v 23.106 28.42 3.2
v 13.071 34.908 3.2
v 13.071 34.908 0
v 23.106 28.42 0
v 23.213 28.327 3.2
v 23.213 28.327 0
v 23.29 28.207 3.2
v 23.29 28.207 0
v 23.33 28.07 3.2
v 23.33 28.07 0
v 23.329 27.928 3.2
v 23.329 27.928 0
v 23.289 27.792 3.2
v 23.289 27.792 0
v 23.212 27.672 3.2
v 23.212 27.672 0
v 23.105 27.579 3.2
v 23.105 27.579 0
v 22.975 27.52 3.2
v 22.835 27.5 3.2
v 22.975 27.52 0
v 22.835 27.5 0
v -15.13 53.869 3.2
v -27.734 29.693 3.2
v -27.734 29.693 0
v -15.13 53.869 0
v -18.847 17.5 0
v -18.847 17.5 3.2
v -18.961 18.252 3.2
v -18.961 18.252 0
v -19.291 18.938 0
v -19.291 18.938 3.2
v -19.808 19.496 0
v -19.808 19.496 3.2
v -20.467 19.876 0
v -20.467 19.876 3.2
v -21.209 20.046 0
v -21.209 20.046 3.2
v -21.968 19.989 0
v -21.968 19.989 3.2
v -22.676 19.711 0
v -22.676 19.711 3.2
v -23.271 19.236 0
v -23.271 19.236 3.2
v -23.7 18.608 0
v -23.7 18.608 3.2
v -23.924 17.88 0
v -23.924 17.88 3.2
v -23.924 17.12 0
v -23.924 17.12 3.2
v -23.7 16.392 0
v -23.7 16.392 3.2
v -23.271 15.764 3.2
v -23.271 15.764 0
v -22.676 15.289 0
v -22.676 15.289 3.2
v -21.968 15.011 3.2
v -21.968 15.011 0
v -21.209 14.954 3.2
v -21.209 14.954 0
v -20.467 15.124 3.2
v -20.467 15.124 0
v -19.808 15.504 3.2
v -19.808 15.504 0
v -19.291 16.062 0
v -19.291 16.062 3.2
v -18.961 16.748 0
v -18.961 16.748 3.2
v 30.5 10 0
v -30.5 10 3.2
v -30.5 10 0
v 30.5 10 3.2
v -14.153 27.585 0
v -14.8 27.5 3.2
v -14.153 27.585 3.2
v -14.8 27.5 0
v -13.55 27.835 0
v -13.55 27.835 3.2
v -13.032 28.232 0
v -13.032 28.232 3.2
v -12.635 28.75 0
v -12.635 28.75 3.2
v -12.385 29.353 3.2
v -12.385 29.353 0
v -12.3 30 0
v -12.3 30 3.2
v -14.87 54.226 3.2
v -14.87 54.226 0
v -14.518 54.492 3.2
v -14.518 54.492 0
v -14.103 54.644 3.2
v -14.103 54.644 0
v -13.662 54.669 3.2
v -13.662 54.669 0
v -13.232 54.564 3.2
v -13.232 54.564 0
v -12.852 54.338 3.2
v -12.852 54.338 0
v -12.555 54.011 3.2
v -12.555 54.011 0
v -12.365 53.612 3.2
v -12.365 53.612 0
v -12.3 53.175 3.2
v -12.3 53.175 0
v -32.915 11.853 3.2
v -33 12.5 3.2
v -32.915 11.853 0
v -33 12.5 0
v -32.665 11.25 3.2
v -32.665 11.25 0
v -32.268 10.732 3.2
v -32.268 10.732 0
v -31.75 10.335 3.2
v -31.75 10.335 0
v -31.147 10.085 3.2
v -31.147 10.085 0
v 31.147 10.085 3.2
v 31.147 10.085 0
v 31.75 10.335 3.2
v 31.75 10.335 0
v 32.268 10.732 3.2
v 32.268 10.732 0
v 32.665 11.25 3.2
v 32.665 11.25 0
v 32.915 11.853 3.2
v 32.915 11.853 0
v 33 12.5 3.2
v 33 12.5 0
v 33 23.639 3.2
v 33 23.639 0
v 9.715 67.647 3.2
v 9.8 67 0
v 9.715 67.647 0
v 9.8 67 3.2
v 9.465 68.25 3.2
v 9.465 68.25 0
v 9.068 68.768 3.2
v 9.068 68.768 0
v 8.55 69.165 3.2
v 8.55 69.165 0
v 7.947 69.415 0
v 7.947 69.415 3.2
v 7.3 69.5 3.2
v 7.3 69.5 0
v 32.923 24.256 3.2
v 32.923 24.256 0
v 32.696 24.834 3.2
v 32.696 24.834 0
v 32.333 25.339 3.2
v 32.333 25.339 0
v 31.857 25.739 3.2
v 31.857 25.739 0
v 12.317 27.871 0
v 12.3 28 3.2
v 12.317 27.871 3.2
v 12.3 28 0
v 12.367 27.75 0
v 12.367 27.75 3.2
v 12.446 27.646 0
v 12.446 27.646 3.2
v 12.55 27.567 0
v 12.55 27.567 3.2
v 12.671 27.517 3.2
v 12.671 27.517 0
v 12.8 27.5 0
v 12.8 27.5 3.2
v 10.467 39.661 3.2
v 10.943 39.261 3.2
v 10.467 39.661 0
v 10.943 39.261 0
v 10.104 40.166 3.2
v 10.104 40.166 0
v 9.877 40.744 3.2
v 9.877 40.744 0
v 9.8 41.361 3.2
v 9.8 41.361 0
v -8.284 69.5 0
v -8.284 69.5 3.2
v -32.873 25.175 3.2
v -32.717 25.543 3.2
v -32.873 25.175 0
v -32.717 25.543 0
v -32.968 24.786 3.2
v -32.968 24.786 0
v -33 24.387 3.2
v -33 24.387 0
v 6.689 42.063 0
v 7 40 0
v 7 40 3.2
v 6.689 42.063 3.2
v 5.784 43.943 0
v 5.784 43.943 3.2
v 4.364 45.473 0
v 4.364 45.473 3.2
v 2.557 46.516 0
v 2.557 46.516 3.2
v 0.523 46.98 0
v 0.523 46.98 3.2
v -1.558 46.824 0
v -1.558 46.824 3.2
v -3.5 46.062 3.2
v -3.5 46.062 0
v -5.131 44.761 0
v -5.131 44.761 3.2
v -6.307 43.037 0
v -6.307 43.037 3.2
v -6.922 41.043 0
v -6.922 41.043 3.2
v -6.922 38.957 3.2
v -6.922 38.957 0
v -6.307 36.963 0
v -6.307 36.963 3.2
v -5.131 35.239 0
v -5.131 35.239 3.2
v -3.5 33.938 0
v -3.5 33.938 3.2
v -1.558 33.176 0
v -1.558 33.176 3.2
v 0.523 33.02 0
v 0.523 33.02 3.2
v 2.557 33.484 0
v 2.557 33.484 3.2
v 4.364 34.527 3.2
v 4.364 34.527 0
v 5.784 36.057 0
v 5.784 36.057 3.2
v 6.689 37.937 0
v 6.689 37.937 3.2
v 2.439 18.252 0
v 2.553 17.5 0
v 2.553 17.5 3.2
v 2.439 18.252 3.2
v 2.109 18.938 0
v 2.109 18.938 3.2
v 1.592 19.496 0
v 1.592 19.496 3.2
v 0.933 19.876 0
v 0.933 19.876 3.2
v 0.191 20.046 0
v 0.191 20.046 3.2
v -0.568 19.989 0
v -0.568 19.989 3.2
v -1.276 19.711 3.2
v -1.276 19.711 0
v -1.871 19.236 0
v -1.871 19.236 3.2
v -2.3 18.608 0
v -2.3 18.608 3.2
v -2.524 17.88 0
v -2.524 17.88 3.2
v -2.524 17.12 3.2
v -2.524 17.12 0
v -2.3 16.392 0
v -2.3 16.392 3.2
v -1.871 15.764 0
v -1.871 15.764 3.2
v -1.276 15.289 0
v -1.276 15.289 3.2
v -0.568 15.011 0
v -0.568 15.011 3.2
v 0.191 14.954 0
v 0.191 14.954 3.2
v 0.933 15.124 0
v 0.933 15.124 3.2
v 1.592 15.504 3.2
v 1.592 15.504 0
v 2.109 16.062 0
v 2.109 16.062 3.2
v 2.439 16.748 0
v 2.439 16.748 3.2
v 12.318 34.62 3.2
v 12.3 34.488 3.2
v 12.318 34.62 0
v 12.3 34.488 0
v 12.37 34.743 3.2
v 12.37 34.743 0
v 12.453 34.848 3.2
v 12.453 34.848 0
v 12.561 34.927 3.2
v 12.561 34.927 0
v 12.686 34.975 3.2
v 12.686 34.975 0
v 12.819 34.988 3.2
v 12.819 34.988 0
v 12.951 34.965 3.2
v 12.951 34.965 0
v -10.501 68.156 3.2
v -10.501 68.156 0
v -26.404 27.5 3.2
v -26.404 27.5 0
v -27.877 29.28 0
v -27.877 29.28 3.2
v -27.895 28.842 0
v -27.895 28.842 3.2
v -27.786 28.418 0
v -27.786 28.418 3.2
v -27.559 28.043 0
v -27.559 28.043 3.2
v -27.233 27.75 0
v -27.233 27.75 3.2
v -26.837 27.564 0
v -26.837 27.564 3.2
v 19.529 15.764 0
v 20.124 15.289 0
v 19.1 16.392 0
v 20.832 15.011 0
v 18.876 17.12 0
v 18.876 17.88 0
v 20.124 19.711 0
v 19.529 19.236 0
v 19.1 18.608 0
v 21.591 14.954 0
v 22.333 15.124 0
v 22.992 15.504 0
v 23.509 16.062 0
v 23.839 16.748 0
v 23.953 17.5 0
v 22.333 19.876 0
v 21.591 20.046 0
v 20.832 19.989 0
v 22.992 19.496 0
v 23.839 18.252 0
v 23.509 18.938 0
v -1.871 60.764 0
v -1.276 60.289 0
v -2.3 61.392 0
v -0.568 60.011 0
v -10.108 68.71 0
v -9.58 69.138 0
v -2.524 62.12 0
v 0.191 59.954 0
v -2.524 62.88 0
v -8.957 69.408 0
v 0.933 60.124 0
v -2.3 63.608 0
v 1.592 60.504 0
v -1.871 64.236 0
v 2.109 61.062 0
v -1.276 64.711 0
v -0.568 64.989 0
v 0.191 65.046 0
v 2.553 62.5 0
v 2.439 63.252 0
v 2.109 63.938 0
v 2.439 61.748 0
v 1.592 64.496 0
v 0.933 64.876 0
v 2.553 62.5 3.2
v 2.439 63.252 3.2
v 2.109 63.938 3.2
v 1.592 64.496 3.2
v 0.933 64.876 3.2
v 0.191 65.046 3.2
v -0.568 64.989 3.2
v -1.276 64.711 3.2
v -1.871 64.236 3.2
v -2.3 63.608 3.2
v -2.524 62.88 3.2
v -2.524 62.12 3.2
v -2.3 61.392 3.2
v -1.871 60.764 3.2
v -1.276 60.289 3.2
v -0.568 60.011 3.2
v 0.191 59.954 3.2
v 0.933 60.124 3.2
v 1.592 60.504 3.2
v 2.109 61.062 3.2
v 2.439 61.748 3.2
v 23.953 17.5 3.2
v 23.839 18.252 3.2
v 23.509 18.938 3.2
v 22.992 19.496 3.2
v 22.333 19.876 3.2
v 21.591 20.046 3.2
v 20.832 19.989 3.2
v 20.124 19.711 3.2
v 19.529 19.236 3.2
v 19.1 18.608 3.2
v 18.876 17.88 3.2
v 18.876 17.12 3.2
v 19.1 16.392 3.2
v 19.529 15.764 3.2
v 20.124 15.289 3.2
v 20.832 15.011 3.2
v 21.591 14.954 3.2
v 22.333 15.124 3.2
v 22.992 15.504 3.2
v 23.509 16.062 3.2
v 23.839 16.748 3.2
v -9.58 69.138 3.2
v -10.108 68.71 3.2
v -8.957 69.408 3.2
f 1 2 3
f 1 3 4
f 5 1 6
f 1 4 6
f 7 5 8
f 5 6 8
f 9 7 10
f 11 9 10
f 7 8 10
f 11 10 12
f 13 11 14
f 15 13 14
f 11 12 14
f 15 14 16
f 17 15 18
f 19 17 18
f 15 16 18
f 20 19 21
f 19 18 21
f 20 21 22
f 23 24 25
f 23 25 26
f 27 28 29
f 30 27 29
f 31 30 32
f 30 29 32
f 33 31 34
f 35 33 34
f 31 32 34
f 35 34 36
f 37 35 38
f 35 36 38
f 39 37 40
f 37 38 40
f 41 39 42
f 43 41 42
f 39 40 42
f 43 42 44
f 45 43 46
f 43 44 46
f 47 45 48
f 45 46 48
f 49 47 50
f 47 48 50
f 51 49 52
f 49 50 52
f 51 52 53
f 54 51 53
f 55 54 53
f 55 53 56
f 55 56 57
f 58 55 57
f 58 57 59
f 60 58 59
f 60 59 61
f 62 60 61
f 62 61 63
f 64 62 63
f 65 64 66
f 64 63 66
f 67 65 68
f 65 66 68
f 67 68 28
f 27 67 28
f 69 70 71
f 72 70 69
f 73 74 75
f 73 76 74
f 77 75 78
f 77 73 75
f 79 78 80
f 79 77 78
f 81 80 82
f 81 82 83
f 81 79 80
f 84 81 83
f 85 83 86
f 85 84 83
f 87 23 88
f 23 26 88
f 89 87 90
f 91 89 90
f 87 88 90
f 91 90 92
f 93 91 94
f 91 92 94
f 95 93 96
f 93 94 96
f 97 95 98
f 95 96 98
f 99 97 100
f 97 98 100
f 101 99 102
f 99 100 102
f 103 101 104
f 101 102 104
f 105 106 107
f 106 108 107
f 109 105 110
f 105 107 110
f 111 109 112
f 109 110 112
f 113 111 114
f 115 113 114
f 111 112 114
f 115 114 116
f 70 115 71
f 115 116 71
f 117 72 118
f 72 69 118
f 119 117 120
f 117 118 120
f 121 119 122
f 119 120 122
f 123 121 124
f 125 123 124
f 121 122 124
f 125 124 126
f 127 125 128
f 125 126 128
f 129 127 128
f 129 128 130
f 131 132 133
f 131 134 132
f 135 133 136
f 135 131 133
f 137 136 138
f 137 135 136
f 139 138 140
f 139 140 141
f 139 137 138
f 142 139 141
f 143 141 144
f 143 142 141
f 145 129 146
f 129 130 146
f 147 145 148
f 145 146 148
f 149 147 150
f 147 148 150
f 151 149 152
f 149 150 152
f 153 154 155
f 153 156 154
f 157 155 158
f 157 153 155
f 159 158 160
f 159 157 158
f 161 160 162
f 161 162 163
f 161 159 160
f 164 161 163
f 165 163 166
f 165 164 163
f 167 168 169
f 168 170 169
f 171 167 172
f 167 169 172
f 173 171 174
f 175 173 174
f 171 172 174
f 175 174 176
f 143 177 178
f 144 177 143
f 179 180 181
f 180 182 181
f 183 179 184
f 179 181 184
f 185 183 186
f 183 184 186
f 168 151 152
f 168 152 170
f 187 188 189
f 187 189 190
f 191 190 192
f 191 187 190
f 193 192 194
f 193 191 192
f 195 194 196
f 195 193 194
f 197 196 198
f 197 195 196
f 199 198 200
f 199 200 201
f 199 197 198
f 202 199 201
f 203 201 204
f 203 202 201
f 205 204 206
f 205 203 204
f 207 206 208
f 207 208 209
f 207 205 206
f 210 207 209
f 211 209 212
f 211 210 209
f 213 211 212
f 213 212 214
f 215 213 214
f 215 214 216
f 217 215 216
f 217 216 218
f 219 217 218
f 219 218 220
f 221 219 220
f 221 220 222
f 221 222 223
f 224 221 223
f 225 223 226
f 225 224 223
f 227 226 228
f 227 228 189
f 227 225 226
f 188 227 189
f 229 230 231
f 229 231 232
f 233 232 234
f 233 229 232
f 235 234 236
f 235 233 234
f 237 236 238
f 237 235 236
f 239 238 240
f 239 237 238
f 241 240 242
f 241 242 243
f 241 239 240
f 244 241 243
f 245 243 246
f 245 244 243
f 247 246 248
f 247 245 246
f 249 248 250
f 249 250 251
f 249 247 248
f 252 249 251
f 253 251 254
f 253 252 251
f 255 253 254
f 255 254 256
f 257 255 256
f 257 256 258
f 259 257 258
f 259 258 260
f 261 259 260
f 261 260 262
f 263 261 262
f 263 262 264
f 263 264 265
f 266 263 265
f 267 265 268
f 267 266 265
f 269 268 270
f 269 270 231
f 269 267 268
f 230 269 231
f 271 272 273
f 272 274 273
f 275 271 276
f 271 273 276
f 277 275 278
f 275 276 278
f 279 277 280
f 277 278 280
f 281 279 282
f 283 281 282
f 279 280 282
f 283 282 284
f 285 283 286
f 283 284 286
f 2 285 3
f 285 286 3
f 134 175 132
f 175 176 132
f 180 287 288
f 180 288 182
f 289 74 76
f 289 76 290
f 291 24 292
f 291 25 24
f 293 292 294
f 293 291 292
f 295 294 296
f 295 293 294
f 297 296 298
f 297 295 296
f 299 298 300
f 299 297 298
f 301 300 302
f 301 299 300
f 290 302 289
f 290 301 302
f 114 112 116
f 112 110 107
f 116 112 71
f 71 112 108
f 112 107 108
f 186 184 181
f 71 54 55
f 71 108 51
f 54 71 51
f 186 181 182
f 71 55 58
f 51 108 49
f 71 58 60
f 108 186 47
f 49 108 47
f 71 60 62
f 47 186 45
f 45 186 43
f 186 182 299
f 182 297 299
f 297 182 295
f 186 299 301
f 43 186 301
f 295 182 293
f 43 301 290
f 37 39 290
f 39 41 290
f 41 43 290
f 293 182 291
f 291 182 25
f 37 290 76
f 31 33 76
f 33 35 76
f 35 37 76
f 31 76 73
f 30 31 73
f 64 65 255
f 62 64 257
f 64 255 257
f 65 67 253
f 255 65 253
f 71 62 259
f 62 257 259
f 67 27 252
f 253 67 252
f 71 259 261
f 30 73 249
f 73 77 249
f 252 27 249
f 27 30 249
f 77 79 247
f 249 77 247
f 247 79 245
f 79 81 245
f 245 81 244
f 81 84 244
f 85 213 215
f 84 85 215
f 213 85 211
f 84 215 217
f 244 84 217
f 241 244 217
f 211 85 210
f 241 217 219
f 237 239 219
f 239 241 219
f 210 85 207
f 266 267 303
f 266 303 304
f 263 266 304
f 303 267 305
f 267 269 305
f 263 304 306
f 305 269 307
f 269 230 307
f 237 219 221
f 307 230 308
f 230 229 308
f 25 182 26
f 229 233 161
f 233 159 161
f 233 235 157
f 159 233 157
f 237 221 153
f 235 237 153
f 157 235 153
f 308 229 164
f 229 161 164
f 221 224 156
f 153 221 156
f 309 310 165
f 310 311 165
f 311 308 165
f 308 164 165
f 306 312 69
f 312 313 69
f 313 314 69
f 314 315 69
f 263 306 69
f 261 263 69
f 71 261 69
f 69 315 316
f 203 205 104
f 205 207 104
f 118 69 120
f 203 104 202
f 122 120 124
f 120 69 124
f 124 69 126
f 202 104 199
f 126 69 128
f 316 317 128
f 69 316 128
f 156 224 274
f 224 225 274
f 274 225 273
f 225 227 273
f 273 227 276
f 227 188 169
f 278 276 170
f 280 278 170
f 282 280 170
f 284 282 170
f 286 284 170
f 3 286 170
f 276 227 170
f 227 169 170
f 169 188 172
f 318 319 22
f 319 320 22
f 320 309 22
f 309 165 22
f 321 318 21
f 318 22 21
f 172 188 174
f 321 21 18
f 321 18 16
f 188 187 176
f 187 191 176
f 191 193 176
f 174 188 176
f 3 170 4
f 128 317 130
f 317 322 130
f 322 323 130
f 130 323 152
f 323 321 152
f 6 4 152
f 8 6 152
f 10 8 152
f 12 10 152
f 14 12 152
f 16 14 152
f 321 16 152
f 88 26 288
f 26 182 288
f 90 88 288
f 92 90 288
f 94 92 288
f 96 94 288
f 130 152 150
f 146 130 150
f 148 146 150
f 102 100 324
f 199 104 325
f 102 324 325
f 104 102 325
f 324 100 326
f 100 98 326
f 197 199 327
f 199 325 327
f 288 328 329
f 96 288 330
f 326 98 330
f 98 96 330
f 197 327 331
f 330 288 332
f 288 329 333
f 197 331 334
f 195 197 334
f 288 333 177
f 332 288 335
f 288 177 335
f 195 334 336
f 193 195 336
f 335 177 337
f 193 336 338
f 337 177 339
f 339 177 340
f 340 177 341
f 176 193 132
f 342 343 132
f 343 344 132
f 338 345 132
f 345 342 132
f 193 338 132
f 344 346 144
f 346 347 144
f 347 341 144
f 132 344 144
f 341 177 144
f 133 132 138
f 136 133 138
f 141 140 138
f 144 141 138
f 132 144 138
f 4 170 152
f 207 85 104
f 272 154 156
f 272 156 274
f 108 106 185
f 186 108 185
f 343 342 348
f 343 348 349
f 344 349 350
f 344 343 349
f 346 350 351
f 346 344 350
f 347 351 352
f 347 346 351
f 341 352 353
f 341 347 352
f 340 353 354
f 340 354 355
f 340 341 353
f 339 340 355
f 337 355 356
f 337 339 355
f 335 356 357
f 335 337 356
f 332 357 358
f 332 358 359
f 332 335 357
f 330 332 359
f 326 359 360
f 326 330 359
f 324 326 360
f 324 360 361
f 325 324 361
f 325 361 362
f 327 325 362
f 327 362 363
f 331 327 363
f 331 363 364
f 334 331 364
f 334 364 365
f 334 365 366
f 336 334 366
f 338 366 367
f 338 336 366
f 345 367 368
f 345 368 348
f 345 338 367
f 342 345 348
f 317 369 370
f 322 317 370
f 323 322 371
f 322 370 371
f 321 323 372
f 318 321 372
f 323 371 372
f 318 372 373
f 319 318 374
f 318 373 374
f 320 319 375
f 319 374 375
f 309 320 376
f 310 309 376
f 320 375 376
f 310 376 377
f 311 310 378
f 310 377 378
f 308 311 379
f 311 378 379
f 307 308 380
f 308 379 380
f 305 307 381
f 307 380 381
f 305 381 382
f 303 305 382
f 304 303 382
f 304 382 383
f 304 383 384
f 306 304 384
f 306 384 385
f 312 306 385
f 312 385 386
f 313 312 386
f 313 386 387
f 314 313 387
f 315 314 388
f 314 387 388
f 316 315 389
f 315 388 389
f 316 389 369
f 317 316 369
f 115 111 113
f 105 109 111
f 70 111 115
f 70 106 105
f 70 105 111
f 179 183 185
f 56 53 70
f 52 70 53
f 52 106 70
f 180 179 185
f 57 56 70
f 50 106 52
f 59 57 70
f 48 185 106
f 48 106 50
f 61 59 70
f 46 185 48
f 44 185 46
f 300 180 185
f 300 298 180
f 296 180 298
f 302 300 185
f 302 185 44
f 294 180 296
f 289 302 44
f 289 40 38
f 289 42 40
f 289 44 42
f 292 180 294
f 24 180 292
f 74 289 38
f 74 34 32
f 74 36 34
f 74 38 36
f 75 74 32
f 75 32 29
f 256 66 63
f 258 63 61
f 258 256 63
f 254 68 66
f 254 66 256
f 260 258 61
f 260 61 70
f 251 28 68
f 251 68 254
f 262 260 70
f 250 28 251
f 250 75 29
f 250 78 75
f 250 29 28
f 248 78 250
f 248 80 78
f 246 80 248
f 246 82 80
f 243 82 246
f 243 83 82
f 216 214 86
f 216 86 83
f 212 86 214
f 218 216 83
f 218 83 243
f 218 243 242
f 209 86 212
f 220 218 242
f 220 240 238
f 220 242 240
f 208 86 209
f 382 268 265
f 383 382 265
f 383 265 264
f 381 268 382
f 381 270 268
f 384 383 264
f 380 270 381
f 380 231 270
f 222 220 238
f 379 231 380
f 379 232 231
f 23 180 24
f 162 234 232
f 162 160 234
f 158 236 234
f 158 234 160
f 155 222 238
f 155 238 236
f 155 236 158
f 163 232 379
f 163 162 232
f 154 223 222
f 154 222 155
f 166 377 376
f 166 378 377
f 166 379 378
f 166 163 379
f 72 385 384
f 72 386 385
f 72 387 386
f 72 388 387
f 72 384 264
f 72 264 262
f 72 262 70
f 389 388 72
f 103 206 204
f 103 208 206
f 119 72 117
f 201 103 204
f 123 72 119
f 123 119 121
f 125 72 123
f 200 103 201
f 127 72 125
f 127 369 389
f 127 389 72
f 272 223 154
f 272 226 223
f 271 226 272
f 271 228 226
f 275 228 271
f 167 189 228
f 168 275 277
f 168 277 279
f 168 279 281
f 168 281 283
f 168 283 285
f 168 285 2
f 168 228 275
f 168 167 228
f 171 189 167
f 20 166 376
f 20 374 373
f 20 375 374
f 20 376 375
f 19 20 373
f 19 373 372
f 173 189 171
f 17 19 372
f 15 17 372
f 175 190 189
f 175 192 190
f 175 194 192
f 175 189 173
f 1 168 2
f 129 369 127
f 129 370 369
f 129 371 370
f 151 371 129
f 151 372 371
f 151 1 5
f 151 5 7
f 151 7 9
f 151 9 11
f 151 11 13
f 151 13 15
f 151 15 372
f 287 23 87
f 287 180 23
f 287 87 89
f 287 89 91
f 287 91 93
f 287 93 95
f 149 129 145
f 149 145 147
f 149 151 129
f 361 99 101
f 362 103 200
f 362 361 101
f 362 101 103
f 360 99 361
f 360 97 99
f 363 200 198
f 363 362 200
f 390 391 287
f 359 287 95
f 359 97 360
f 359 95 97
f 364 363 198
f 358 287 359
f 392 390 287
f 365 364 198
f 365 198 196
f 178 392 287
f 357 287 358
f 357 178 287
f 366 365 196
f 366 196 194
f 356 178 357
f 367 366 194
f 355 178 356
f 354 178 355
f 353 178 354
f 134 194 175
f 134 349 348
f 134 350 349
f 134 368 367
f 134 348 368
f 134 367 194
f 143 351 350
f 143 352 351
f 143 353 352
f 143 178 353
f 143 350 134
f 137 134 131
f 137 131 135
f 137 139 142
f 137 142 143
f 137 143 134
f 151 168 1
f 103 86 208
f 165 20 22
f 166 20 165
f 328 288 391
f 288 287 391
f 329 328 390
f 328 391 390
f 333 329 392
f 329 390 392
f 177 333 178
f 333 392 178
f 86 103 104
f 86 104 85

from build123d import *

# Parameters (mm, degrees)
SKETCH1_W                          = 19.6
SKETCH1_H                          = 44.5
SKETCH1_R                          = 2.5527
SKETCH1_R_2                        = 7
SKETCH1_H_2                        = 15
BOSS_EXTRUDE1_DEPTH                = 3.2
SKETCH2_W                          = 23.2
SKETCH2_H                          = 15
SKETCH2_R                          = 2.5527
T_SHAPE_EXTENSION_DEPTH            = 3.2
ASYMMETRIC_TRIANGLE_SUPPORTS_DEPTH = 3.2
FILLET1_R                          = 1.5
FILLET2_R                          = 2.5
FILLET3_R                          = 0.5
FILLET4_R                          = 2.5


with BuildPart() as part:
    # Sketch1 → Boss-Extrude1 (new body)
    # profile 1 of 2: a face of its own
    with BuildSketch(Plane.XY):
        with Locations((0, 47.25)):
            Rectangle(SKETCH1_W, SKETCH1_H)
        with Locations((0, 62.5)):
            Circle(SKETCH1_R, mode=Mode.SUBTRACT)
        with Locations((0, 40)):
            Circle(SKETCH1_R_2, mode=Mode.SUBTRACT)
    # profile 2 of 2: a face of its own
    with BuildSketch(Plane.XY):
        with Locations((0, 17.5)):
            Rectangle(SKETCH1_W, SKETCH1_H_2)
        with Locations((0, 17.5)):
            Circle(SKETCH1_R, mode=Mode.SUBTRACT)
    extrude(amount=BOSS_EXTRUDE1_DEPTH)

    # Sketch2 → T-shape Extension (add)
    # profile 1 of 2: a face of its own
    with BuildSketch(Plane.XY.offset(3.2)):
        with Locations((21.4, 17.5)):
            Rectangle(SKETCH2_W, SKETCH2_H)
        with Locations((21.4, 17.5)):
            Circle(SKETCH2_R, mode=Mode.SUBTRACT)
    # profile 2 of 2: a face of its own
    with BuildSketch(Plane.XY.offset(3.2)):
        with Locations((-21.4, 17.5)):
            Rectangle(SKETCH2_W, SKETCH2_H)
        with Locations((-21.4, 17.5)):
            Circle(SKETCH2_R, mode=Mode.SUBTRACT)
    extrude(amount=-T_SHAPE_EXTENSION_DEPTH)

    # Sketch8 → Asymmetric Triangle Supports (add)
    # profile 1 of 2: a face of its own
    with BuildSketch(Plane.XY.offset(3.2)):
        Polygon((-9.8, 69.5), (-33, 25), (-9.8, 25), align=None)
        Polygon((-12.3, 59.296922481), (-12.3, 27.5), (-28.877271945, 27.5), align=None, mode=Mode.SUBTRACT)
    # profile 2 of 2: a face of its own
    with BuildSketch(Plane.XY.offset(3.2)):
        Polygon((9.8, 25), (33, 25), (9.8, 40), align=None)
        Polygon((12.3, 27.5), (12.3, 35.40659498), (24.528866903, 27.5), align=None, mode=Mode.SUBTRACT)
    extrude(amount=-ASYMMETRIC_TRIANGLE_SUPPORTS_DEPTH)

    # Fillet1
    fillet1_edges = [part.edges().sort_by_distance(p)[0] for p in [
        (-28.877271945, 27.5, 1.6),
        (-12.3, 59.296922481, 1.6),
    ]]
    fillet(fillet1_edges, radius=FILLET1_R)

    # Fillet2
    fillet2_edges = [part.edges().sort_by_distance(p)[0] for p in [
        (-12.3, 27.5, 1.6),
    ]]
    fillet(fillet2_edges, radius=FILLET2_R)

    # Fillet3
    fillet3_edges = [part.edges().sort_by_distance(p)[0] for p in [
        (24.528866903, 27.5, 1.6),
        (12.3, 27.5, 1.6),
        (12.3, 35.40659498, 1.6),
    ]]
    fillet(fillet3_edges, radius=FILLET3_R)

    # Fillet4
    fillet4_edges = [part.edges().sort_by_distance(p)[0] for p in [
        (-9.8, 69.5, 1.6),
        (9.8, 69.5, 1.6),
        (33, 25, 1.6),
        (33, 10, 1.6),
        (-33, 10, 1.6),
        (-33, 25, 1.6),
        (9.8, 40, 1.6),
    ]]
    fillet(fillet4_edges, radius=FILLET4_R)


solid = part.part
